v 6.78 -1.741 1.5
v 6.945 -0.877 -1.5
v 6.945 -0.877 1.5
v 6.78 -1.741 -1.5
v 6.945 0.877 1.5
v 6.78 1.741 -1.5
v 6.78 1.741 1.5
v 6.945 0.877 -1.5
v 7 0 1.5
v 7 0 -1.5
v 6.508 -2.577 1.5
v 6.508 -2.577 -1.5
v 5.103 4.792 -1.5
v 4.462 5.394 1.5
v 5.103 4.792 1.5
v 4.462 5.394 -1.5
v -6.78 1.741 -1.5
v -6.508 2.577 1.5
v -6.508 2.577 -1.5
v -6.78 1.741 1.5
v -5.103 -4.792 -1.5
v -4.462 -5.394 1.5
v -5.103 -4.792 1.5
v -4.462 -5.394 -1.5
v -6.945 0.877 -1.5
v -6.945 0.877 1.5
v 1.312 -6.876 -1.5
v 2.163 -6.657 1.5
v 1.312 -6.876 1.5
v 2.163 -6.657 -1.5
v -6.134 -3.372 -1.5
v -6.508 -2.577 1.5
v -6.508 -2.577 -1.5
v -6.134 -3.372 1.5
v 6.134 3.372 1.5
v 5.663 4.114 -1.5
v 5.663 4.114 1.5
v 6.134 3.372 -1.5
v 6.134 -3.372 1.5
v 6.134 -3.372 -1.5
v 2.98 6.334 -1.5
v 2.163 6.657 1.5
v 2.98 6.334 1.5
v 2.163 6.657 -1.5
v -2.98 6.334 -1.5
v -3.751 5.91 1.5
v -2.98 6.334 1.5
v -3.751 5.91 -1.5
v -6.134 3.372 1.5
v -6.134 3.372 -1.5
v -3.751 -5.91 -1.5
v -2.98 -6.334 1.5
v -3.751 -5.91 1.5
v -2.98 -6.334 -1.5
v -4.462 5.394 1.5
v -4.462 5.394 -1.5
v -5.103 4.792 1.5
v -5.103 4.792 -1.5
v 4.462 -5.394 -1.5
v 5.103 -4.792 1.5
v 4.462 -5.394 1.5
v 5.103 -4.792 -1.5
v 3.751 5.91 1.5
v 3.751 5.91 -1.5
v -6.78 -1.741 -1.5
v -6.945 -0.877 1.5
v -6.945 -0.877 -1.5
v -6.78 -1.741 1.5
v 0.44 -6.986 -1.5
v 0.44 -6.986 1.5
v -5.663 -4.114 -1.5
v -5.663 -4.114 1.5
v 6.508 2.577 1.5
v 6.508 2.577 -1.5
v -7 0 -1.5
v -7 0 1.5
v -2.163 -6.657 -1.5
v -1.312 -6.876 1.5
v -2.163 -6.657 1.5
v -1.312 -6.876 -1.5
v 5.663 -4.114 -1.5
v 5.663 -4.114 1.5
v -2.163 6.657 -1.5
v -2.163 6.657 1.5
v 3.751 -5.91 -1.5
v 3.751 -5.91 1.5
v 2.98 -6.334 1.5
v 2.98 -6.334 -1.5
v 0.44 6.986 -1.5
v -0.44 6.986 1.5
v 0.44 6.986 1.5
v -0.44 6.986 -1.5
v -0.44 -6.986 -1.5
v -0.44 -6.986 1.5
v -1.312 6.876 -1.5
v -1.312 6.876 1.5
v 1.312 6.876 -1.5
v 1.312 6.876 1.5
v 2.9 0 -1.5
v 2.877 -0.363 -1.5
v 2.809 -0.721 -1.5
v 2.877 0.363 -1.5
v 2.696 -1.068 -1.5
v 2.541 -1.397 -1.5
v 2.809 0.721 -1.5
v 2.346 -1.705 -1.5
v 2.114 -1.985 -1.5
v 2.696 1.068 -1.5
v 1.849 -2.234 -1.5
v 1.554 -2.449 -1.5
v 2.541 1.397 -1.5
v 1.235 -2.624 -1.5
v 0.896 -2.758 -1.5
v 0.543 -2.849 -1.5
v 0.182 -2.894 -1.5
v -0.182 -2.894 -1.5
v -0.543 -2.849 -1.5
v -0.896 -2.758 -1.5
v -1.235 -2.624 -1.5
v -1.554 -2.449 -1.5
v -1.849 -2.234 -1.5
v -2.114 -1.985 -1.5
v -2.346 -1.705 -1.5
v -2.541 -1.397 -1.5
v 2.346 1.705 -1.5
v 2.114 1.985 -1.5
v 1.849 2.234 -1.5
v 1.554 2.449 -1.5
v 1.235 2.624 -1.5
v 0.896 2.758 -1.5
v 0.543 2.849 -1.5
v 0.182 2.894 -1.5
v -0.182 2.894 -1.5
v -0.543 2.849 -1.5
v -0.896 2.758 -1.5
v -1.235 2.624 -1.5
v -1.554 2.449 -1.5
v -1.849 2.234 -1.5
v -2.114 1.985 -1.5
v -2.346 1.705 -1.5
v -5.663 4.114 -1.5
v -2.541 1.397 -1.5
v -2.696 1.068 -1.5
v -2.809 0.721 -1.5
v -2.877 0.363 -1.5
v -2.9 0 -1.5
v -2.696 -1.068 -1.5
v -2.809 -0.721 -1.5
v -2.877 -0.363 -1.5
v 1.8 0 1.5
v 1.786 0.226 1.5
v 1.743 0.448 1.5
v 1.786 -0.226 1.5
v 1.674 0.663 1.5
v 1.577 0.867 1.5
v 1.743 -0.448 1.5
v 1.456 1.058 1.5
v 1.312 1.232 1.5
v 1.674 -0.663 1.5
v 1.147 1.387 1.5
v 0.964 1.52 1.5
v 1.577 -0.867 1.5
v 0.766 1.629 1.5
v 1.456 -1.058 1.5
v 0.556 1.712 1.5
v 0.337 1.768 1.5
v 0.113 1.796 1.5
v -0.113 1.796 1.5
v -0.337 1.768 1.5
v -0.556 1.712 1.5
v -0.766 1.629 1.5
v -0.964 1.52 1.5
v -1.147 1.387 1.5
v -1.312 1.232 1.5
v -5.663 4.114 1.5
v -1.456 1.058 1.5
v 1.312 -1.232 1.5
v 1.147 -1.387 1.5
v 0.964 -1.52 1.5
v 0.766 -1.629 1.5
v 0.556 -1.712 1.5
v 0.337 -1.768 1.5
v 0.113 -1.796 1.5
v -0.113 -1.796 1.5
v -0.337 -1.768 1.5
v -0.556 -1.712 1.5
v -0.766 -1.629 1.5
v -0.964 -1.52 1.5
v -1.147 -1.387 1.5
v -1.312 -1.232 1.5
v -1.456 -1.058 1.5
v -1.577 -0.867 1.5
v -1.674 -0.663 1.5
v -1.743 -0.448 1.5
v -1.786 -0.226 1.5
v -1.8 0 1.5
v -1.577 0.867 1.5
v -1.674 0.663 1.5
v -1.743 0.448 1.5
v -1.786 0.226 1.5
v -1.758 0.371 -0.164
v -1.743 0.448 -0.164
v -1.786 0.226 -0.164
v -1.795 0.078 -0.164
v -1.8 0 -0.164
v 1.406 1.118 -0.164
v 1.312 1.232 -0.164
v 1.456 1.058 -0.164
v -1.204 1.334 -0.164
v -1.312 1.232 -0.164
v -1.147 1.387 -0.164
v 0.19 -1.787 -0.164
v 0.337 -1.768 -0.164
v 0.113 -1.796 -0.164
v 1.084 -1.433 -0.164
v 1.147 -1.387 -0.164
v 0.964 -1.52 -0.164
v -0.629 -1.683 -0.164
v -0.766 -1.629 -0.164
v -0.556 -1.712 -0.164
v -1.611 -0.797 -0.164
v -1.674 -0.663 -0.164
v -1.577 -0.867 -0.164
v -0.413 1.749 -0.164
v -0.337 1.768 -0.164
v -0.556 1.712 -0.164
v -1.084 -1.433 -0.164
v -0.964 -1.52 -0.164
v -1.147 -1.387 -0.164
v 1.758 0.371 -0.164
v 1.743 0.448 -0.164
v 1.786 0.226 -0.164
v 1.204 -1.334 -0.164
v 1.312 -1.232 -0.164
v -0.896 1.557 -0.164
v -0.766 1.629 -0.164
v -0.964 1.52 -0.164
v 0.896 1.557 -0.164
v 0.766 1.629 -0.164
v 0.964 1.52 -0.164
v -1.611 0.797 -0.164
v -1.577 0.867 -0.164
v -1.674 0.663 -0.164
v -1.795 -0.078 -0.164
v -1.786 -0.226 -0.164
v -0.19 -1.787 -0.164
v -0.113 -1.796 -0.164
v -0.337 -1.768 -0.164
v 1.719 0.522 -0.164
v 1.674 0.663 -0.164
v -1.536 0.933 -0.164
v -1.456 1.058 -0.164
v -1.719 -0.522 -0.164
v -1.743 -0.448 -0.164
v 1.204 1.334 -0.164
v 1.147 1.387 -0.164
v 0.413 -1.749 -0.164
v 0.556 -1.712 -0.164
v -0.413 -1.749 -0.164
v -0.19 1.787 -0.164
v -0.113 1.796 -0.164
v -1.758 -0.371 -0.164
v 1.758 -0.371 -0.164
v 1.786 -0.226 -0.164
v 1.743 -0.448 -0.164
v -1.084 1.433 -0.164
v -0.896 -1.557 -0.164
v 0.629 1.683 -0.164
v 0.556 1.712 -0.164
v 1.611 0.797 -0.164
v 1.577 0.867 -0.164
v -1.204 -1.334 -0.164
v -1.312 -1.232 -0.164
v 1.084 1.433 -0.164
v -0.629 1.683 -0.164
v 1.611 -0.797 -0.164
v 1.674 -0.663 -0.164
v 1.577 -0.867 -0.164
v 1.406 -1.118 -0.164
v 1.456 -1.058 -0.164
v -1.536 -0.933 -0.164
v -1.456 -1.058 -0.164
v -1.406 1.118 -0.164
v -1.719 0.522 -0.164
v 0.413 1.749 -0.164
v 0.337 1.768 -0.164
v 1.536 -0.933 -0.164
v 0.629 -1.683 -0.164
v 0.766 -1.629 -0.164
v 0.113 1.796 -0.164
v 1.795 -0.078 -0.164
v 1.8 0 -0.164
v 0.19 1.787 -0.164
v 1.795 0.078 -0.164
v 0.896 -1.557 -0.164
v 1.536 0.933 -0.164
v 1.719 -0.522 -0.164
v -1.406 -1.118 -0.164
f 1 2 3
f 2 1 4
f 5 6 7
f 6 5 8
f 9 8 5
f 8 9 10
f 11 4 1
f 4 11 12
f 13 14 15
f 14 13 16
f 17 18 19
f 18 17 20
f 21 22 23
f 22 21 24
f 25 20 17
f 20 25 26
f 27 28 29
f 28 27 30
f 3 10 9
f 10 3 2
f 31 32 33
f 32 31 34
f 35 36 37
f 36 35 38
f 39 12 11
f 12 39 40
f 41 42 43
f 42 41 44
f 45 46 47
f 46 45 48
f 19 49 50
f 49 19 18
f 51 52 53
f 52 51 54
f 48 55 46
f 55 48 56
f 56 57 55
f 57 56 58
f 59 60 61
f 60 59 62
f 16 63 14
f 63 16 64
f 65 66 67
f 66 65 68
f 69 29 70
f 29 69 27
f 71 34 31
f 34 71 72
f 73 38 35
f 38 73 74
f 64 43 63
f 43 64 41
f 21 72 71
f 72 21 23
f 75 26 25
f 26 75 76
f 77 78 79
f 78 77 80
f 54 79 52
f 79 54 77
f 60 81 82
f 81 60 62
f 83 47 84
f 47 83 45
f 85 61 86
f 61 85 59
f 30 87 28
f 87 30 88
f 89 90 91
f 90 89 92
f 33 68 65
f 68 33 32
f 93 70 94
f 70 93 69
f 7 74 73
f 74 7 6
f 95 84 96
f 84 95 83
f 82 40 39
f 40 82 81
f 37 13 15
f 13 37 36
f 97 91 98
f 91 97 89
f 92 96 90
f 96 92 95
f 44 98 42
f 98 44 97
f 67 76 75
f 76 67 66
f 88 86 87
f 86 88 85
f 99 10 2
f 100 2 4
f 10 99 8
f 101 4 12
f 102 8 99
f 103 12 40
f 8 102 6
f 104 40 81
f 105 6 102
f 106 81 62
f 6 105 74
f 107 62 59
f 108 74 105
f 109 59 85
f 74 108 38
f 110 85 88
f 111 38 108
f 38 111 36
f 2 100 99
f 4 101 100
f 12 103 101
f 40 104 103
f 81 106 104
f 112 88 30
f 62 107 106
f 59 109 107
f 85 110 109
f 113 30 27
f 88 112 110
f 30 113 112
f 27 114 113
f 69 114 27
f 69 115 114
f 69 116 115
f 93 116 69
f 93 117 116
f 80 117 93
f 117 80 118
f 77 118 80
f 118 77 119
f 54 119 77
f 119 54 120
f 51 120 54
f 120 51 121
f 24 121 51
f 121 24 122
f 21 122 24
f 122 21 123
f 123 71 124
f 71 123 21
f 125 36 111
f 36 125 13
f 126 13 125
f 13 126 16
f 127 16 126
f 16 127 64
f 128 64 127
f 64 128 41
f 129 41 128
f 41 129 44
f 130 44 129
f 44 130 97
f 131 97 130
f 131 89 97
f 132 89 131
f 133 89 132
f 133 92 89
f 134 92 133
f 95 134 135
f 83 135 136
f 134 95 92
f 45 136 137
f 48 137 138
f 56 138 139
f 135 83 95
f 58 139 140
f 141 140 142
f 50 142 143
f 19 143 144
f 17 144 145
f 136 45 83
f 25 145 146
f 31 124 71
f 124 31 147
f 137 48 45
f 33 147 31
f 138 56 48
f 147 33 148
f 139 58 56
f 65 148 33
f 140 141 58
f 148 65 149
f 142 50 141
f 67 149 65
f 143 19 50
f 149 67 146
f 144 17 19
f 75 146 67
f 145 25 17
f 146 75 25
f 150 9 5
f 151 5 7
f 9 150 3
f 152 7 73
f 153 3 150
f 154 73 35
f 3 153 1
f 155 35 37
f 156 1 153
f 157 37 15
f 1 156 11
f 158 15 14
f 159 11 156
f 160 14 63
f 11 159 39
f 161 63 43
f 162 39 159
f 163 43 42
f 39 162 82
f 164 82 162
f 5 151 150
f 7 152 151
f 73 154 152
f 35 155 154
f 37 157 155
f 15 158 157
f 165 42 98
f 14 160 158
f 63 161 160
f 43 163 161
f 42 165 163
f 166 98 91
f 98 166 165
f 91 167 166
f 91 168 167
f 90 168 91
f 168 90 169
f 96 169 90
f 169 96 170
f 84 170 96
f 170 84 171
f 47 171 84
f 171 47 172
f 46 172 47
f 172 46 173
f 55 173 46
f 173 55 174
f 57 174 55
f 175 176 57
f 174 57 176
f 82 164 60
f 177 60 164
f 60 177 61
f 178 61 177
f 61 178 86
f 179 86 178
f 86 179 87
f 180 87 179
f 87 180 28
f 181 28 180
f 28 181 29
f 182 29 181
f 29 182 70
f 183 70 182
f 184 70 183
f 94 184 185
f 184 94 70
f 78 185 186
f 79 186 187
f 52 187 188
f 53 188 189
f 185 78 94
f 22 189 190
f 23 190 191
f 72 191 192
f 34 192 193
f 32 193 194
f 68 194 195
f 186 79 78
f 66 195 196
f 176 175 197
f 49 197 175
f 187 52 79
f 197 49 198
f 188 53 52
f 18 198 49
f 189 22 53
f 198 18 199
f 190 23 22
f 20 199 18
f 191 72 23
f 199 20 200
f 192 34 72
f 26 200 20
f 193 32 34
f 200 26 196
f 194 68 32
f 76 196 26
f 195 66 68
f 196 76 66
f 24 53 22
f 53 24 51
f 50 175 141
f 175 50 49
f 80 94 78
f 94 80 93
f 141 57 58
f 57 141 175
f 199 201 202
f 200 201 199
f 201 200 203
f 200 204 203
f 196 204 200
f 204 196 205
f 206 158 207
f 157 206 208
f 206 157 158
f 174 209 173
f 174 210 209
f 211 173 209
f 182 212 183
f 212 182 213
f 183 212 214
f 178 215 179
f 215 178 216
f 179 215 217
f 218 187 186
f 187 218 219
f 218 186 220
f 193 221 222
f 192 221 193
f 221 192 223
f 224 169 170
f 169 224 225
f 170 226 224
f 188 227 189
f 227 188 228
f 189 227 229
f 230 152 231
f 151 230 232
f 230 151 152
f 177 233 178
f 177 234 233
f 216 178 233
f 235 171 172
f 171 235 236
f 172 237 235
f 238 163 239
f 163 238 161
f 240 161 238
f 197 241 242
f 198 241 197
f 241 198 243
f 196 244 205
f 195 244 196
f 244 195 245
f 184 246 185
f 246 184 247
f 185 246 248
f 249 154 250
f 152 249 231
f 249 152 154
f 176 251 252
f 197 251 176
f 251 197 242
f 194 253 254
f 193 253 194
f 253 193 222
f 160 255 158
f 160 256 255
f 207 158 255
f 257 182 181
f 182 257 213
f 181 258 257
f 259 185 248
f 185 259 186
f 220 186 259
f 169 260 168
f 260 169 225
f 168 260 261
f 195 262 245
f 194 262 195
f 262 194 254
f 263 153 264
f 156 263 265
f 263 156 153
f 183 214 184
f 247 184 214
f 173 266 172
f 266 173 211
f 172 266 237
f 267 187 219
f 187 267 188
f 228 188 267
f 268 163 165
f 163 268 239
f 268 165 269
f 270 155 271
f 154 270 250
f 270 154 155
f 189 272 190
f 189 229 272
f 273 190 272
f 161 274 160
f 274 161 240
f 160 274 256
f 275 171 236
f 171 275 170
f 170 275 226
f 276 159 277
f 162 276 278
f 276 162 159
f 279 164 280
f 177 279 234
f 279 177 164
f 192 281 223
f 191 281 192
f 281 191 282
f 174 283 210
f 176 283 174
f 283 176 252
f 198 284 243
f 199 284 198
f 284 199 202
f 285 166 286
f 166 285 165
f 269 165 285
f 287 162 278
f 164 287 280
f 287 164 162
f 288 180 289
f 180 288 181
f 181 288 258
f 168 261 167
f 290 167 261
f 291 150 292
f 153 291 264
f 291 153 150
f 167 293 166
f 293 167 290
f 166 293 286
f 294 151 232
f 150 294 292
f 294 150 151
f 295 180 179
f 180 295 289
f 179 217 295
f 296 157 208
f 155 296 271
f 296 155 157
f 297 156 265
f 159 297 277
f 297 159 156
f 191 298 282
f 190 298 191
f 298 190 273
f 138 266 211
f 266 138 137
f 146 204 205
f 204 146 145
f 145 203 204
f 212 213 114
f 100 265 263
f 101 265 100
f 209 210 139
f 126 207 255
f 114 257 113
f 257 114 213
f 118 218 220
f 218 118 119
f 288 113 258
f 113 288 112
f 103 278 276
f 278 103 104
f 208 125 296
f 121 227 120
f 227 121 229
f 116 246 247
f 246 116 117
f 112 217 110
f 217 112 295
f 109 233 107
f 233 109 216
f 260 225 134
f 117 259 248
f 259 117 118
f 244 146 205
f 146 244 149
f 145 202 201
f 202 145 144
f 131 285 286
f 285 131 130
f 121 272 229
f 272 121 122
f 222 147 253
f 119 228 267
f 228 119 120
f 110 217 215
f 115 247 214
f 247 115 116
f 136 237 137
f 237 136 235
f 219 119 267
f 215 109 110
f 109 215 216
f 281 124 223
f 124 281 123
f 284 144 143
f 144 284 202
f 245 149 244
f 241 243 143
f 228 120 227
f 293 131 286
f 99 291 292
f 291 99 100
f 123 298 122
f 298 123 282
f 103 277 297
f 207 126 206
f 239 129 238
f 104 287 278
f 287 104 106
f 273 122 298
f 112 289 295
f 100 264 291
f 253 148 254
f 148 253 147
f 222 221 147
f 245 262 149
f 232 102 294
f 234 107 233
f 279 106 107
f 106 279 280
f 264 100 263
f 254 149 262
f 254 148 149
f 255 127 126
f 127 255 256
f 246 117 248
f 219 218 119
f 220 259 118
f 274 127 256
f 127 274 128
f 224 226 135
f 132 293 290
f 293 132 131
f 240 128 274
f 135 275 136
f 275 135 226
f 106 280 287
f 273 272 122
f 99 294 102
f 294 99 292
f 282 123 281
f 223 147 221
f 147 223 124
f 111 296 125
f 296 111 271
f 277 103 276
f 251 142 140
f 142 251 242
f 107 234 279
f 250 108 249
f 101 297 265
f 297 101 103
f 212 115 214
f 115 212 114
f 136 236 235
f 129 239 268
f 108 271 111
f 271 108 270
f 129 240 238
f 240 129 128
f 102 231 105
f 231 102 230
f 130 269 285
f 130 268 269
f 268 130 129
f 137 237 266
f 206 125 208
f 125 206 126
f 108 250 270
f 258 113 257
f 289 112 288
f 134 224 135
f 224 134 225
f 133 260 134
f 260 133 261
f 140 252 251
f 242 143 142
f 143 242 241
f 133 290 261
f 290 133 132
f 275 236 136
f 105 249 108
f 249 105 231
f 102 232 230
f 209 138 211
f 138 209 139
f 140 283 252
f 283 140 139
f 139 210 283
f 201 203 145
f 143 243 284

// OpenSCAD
$fn = 50;


difference() {
	union() {
		translate(v = [0, 0, -1.5000000000]) {
			cylinder(h = 3, r = 7.0000000000);
		}
		translate(v = [0, 0, -1.5000000000]) {
			cylinder(h = 3, r = 3.0000000000);
		}
	}
	union() {
		translate(v = [0, 0, -1.5000000000]) {
			rotate(a = [0, 180, 0]) {
				difference() {
					union() {
						translate(v = [0, 0, -3.0000000000]) {
							cylinder(h = 3, r = 1.5000000000);
						}
						translate(v = [0, 0, -3.0000000000]) {
							cylinder(h = 3, r = 1.8000000000);
						}
						translate(v = [0, 0, -1.7000000000]) {
							cylinder(h = 1.7000000000, r1 = 1.5000000000, r2 = 2.9000000000);
						}
						translate(v = [0, 0, -3.0000000000]) {
							cylinder(h = 3, r = 1.5000000000);
						}
					}
					union();
				}
			}
		}
		translate(v = [0, 0, -50.0000000000]) {
			cylinder(h = 100, r = 1.5000000000);
		}
	}
}
